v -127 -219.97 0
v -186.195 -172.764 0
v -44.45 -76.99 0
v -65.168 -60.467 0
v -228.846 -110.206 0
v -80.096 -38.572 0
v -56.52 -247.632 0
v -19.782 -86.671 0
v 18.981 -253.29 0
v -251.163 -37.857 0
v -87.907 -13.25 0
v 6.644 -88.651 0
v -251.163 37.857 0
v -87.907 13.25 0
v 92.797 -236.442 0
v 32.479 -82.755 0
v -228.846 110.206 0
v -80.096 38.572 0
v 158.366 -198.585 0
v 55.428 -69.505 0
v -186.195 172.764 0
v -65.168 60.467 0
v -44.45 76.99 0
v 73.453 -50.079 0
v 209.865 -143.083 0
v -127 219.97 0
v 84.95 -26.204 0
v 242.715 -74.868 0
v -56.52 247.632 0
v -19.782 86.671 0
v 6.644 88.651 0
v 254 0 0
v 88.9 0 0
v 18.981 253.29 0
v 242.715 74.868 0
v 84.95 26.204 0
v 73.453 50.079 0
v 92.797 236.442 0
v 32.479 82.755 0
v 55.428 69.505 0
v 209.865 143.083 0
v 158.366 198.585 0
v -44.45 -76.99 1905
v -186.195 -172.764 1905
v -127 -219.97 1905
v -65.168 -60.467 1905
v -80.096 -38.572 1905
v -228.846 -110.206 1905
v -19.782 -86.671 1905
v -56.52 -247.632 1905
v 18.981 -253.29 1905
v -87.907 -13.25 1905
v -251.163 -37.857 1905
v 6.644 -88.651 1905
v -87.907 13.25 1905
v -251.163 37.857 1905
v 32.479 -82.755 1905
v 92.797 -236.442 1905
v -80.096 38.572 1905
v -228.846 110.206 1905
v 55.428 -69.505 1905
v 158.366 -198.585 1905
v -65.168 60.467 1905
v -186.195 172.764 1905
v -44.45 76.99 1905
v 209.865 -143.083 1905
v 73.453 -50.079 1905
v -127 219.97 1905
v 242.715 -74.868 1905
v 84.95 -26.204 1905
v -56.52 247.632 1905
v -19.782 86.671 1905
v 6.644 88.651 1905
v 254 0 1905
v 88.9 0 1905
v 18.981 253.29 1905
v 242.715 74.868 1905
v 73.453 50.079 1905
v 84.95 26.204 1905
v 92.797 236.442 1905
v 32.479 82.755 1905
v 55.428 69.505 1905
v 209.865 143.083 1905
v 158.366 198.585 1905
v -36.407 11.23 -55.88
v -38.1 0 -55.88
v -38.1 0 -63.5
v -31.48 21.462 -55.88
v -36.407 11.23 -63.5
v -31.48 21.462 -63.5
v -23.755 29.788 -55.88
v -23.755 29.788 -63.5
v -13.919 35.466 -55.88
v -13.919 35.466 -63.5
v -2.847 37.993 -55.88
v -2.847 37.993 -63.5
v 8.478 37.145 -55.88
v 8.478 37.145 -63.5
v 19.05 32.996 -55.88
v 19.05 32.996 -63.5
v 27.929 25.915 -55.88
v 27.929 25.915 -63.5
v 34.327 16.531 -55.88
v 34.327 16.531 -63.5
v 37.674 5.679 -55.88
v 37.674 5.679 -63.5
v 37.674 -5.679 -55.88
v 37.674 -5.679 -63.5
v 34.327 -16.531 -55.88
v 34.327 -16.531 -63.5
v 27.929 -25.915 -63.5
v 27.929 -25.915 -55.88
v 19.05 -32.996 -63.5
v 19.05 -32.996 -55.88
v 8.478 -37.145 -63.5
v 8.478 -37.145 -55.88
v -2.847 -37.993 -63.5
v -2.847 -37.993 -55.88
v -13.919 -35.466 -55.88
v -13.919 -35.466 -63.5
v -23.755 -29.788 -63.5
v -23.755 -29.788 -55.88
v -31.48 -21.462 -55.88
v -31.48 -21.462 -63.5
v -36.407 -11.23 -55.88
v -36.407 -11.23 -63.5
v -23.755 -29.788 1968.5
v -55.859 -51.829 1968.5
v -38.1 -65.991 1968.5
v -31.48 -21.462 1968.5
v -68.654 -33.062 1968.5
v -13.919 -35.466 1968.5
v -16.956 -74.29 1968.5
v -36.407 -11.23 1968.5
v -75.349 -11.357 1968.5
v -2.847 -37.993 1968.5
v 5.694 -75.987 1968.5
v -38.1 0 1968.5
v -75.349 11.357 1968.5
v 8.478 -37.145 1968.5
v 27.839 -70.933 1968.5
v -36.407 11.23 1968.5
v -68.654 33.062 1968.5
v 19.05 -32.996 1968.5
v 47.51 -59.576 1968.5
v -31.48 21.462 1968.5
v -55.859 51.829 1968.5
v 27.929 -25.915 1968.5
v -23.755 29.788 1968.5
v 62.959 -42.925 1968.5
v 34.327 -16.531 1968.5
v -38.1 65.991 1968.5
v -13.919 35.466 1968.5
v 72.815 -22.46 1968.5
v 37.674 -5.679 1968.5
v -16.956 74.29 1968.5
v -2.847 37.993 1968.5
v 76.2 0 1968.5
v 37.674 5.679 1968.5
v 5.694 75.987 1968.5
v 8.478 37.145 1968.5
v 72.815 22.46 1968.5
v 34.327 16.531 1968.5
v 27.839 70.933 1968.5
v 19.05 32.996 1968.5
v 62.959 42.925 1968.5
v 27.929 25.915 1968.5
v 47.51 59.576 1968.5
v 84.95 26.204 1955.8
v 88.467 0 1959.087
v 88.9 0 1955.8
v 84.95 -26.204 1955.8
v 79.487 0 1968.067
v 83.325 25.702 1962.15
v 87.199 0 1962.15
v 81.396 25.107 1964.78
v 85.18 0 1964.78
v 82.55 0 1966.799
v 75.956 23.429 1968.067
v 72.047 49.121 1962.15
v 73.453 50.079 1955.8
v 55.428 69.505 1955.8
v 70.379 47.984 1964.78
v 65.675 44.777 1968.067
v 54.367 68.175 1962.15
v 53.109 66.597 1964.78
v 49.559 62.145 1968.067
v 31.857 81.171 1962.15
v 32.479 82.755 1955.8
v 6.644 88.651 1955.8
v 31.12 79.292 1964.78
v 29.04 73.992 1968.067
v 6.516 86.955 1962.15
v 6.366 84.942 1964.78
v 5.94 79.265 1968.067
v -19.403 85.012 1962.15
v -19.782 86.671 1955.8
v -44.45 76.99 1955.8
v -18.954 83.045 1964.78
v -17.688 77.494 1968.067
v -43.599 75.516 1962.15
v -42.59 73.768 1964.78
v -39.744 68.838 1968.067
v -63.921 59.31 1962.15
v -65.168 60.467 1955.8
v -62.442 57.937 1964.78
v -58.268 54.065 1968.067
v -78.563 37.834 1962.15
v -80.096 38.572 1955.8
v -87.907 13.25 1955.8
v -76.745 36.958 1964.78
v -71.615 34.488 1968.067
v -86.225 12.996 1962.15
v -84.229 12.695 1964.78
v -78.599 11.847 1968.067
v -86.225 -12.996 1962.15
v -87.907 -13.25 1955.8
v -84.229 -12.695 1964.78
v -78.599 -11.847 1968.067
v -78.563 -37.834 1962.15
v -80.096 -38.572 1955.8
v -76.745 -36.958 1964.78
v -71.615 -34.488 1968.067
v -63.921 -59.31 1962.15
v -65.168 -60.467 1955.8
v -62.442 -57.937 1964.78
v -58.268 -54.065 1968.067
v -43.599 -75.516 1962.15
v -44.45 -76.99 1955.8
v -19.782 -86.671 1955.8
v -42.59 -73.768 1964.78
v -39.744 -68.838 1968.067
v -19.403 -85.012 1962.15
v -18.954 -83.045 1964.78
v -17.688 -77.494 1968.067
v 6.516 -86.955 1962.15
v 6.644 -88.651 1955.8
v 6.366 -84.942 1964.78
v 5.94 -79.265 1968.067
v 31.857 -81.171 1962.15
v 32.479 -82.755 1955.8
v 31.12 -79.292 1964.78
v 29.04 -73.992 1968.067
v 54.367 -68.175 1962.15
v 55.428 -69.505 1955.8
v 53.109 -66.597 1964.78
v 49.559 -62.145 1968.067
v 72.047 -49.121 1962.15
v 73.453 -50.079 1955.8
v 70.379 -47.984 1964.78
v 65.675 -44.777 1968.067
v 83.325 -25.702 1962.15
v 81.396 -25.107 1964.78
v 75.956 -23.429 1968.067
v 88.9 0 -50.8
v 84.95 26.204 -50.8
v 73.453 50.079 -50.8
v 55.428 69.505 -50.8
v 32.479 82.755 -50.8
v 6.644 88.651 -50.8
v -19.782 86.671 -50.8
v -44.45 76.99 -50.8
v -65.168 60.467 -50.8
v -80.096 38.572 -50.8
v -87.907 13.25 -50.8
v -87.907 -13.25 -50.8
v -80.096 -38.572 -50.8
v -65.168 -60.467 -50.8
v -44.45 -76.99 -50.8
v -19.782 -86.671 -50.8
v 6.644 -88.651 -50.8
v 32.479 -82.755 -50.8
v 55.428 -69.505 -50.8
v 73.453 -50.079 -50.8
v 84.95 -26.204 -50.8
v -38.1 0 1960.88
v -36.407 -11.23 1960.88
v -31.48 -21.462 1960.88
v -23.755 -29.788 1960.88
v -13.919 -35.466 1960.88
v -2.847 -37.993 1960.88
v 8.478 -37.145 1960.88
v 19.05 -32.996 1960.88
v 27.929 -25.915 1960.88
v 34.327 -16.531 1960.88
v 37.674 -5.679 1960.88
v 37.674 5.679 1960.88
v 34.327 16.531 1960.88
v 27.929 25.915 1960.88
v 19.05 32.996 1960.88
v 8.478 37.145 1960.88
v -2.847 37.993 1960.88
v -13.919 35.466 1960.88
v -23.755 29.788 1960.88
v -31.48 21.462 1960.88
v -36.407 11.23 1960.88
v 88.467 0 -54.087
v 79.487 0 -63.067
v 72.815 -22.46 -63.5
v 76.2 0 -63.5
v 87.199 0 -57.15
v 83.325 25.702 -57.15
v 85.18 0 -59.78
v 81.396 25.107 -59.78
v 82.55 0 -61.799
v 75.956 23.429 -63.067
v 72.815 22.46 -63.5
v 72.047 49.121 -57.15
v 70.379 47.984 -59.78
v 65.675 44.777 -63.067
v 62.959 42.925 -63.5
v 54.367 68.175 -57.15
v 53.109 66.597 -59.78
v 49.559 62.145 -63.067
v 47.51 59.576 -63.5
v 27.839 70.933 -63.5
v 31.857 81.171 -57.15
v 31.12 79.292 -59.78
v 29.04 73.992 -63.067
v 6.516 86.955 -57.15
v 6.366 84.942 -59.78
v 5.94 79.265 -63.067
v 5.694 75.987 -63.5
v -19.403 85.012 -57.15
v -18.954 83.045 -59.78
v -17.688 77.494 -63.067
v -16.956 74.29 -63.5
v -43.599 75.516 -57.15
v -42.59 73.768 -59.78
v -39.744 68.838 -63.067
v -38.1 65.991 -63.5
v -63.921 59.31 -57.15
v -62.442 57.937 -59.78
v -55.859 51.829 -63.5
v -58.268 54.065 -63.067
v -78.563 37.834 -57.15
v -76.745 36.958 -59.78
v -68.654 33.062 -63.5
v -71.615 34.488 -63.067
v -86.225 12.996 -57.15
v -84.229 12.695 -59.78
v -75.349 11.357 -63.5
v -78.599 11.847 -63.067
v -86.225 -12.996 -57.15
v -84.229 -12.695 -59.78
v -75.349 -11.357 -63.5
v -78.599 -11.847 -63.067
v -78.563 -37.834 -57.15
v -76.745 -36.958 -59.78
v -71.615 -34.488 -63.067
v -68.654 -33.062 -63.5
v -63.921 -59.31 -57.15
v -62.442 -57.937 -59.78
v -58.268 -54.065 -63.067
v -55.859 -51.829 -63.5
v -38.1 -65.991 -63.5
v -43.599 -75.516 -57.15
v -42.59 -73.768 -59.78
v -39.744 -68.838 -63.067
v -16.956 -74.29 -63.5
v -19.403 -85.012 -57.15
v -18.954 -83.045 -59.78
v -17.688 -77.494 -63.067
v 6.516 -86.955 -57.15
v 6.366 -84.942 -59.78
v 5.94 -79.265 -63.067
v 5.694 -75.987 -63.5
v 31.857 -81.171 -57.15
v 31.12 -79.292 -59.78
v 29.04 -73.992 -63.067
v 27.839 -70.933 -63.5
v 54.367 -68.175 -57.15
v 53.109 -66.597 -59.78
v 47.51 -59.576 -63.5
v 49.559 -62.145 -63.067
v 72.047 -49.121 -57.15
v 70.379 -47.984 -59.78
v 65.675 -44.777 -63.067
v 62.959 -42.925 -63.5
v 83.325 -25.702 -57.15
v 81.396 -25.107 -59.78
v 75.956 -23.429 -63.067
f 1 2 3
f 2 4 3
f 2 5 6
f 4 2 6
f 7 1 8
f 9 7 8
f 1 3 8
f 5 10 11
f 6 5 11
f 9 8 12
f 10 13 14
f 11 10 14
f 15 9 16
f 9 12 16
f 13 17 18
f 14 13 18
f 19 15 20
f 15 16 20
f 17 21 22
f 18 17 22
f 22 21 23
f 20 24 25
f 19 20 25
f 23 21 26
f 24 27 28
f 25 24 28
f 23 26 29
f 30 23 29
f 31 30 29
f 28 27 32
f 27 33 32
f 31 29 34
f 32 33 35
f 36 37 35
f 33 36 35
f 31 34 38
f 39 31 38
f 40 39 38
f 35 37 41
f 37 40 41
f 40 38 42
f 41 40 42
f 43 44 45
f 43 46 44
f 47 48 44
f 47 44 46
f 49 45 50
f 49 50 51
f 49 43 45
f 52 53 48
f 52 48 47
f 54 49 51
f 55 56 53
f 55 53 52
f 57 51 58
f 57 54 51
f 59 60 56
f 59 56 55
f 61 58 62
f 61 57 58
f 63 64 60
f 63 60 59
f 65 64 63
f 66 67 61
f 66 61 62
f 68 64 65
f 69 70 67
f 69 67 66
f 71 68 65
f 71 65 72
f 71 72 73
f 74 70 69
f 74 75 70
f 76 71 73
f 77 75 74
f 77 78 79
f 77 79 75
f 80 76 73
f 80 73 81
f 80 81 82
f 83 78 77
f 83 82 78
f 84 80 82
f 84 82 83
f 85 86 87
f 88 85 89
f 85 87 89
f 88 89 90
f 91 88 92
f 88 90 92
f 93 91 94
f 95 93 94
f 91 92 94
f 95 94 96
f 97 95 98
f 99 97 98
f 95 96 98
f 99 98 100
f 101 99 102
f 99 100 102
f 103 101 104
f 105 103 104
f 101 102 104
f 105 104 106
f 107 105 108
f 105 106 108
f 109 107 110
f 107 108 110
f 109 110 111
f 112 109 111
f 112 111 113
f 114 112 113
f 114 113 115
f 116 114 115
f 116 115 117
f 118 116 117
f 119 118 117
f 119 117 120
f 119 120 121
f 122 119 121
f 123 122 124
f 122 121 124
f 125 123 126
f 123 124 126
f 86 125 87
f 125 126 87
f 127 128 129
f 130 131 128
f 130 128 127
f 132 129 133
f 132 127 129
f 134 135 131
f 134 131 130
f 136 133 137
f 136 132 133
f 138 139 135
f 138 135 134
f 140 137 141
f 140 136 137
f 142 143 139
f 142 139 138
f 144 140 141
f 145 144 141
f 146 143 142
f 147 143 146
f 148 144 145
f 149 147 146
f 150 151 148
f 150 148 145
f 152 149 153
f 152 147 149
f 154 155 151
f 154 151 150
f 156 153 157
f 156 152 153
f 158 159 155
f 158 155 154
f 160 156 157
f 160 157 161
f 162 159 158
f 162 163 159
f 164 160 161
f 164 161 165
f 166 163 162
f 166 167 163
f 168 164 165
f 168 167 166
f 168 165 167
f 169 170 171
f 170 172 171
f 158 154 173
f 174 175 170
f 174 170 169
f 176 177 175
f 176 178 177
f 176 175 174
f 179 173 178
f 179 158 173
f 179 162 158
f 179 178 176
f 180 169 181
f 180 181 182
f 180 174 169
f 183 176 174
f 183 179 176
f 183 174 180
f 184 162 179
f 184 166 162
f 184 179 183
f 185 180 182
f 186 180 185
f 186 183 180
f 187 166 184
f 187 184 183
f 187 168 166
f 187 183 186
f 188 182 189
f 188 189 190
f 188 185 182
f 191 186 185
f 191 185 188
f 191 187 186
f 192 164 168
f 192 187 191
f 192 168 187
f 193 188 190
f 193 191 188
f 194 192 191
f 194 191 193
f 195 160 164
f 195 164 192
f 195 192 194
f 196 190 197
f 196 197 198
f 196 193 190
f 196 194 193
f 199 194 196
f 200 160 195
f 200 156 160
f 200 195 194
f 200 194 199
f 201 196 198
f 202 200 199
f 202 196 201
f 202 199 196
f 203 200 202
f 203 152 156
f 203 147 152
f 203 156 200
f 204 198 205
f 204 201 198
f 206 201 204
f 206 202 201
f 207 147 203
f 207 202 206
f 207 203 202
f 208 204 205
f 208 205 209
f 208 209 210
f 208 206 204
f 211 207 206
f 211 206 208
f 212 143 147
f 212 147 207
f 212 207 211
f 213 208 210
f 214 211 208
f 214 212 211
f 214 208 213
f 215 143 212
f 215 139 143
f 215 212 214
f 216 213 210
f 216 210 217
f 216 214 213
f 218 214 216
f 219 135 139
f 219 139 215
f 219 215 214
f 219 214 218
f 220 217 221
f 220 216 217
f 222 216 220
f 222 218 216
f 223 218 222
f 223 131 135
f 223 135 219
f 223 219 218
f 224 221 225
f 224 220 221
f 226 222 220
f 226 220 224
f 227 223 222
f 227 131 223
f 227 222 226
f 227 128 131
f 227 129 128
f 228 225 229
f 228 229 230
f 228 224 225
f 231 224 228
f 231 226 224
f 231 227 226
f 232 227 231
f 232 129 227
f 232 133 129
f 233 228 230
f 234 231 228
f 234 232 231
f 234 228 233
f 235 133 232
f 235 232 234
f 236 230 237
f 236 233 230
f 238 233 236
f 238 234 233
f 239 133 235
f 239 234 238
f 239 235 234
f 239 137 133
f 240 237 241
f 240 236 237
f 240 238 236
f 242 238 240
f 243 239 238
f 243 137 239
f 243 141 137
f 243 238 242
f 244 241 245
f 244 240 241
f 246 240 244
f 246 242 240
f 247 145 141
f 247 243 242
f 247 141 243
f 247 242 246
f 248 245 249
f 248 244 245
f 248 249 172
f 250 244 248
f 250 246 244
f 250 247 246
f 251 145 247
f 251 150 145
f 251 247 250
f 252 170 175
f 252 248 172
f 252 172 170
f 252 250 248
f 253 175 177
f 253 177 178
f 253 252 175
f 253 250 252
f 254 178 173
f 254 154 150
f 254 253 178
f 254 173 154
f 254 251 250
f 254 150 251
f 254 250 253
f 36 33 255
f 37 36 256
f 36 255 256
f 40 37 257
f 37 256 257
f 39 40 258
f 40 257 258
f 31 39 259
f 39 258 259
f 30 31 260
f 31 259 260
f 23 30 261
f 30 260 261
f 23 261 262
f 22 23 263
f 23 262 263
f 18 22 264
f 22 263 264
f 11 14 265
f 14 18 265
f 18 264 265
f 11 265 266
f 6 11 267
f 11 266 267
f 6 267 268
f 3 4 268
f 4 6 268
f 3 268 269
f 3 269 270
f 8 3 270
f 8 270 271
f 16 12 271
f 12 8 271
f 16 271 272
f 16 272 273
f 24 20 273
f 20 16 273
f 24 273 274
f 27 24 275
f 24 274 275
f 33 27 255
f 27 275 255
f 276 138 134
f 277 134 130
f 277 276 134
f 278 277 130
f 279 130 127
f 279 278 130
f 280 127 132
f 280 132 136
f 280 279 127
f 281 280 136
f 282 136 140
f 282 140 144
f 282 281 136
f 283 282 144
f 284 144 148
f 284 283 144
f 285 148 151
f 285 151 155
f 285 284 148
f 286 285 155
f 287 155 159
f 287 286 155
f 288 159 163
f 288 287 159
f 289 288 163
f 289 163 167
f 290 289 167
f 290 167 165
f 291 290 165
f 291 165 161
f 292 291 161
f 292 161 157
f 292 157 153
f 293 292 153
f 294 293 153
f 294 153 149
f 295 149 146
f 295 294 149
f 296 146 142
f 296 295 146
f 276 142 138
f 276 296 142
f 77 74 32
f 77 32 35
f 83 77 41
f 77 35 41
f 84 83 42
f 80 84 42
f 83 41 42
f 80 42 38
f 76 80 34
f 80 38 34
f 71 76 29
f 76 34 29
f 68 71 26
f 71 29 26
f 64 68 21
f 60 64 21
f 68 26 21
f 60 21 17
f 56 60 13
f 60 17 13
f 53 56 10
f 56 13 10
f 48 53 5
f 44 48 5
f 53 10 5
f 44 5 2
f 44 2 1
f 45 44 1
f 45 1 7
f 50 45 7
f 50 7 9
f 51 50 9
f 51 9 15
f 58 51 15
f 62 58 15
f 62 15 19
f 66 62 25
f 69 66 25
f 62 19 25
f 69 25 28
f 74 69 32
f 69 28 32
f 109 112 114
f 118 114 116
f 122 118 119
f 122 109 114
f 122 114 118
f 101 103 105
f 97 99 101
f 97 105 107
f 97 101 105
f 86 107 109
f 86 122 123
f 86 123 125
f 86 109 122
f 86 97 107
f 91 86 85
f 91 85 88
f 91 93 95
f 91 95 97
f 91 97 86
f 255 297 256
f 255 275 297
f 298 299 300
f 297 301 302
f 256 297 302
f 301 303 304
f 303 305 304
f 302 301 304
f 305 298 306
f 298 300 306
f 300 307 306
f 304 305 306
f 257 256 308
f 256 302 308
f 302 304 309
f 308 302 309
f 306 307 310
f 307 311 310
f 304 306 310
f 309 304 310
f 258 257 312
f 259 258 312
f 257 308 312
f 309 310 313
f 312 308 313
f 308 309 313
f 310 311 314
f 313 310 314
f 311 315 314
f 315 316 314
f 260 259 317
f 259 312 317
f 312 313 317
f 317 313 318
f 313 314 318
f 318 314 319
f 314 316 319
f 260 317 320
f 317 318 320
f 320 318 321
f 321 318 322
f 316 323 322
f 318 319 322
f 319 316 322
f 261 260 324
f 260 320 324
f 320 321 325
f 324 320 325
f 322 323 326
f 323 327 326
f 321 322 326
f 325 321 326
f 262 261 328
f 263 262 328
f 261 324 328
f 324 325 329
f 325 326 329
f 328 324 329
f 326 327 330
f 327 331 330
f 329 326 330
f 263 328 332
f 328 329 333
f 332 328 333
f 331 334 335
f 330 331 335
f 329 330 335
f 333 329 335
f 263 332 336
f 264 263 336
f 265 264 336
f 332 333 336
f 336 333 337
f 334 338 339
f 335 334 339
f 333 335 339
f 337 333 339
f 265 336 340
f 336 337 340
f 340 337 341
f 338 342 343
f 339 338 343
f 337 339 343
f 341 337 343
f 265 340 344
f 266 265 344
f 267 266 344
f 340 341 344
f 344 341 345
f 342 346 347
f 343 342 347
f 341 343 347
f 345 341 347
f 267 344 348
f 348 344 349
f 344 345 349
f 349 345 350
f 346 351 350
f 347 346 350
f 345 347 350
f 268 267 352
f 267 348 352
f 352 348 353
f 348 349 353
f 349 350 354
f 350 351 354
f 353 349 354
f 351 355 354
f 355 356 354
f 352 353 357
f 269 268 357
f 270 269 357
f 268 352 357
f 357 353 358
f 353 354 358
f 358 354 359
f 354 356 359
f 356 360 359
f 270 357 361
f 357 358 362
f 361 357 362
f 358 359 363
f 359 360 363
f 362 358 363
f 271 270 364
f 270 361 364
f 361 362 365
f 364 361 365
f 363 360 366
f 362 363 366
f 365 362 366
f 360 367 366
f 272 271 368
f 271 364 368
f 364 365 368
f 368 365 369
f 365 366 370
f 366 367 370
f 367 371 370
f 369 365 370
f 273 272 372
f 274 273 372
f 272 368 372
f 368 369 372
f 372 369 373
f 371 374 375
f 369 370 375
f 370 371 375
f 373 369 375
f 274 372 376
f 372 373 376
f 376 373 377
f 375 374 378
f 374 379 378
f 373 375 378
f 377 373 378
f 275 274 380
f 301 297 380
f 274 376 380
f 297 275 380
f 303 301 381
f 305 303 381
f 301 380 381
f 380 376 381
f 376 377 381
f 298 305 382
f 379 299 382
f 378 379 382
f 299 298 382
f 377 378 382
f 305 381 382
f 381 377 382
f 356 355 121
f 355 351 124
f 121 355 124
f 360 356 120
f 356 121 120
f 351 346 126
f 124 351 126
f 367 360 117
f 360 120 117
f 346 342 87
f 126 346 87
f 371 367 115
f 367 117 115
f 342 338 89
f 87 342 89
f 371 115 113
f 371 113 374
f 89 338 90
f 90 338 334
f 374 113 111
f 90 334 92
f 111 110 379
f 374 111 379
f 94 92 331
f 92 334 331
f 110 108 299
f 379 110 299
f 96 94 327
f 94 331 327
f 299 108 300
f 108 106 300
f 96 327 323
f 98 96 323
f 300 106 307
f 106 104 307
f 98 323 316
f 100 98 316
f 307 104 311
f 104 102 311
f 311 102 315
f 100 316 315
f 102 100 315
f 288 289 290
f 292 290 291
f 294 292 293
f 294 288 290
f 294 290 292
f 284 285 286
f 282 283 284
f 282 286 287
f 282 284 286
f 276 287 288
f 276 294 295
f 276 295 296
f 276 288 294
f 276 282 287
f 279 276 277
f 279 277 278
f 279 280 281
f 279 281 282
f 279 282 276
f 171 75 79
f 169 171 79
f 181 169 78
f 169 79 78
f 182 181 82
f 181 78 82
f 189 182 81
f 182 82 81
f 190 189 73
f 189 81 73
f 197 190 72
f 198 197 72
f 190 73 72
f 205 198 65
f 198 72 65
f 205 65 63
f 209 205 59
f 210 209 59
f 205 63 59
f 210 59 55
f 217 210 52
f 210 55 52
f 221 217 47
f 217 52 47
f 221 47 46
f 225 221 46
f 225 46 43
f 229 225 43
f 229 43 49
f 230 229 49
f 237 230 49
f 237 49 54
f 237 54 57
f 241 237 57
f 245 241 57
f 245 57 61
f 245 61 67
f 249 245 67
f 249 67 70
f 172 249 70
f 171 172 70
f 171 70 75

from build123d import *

# Parameters (mm, degrees)
SKETCH2_R                = 254
BOSS_EXTRUDE2_DEPTH      = 1905
BOSS_EXTRUDE3_DEPTH      = 63.5
BOSS_EXTRUDE3_DEPTH_BACK = 1968.5
SKETCH3_R                = 88.9
FILLET1_R                = 12.7
SKETCH4_R                = 38.1
CUT_EXTRUDE1_DEPTH       = 7.62
CUT_EXTRUDE2_START       = -7.62
SKETCH5_R                = 38.1
CUT_EXTRUDE2_DEPTH       = 7.62


with BuildPart() as part:
    # Sketch2 → Boss-Extrude2 (new body)
    with BuildSketch(Plane.XY):
        Circle(SKETCH2_R)
    extrude(amount=BOSS_EXTRUDE2_DEPTH)

    # Sketch3 → Boss-Extrude3 (add, two sides: drawn at the far end of the back side and taken through both)
    with BuildSketch(Plane.XY.offset(1905).offset(-BOSS_EXTRUDE3_DEPTH_BACK)):
        Circle(SKETCH3_R)
    extrude(amount=BOSS_EXTRUDE3_DEPTH + BOSS_EXTRUDE3_DEPTH_BACK)

    # Fillet1
    fillet1_edges = [part.edges().sort_by_distance(p)[0] for p in [
        (-88.9, 0, -63.5),
        (-88.9, 0, 1968.5),
    ]]
    fillet(fillet1_edges, radius=FILLET1_R)

    # Sketch4 → Cut-Extrude1 (cut)
    with BuildSketch(Plane(origin=(0, 0, -63.5), x_dir=(-1, 0, 0), z_dir=(0, 0, -1))):
        Circle(SKETCH4_R)
    extrude(amount=-CUT_EXTRUDE1_DEPTH, mode=Mode.SUBTRACT)

    # Sketch5 → Cut-Extrude2 (cut)
    with BuildSketch(Plane.XY.offset(1968.5).offset(CUT_EXTRUDE2_START)):
        with Locations(Location((0, 0, 0), (0, 0, 180))):
            Circle(SKETCH5_R)
    extrude(amount=CUT_EXTRUDE2_DEPTH, mode=Mode.SUBTRACT)


solid = part.part
